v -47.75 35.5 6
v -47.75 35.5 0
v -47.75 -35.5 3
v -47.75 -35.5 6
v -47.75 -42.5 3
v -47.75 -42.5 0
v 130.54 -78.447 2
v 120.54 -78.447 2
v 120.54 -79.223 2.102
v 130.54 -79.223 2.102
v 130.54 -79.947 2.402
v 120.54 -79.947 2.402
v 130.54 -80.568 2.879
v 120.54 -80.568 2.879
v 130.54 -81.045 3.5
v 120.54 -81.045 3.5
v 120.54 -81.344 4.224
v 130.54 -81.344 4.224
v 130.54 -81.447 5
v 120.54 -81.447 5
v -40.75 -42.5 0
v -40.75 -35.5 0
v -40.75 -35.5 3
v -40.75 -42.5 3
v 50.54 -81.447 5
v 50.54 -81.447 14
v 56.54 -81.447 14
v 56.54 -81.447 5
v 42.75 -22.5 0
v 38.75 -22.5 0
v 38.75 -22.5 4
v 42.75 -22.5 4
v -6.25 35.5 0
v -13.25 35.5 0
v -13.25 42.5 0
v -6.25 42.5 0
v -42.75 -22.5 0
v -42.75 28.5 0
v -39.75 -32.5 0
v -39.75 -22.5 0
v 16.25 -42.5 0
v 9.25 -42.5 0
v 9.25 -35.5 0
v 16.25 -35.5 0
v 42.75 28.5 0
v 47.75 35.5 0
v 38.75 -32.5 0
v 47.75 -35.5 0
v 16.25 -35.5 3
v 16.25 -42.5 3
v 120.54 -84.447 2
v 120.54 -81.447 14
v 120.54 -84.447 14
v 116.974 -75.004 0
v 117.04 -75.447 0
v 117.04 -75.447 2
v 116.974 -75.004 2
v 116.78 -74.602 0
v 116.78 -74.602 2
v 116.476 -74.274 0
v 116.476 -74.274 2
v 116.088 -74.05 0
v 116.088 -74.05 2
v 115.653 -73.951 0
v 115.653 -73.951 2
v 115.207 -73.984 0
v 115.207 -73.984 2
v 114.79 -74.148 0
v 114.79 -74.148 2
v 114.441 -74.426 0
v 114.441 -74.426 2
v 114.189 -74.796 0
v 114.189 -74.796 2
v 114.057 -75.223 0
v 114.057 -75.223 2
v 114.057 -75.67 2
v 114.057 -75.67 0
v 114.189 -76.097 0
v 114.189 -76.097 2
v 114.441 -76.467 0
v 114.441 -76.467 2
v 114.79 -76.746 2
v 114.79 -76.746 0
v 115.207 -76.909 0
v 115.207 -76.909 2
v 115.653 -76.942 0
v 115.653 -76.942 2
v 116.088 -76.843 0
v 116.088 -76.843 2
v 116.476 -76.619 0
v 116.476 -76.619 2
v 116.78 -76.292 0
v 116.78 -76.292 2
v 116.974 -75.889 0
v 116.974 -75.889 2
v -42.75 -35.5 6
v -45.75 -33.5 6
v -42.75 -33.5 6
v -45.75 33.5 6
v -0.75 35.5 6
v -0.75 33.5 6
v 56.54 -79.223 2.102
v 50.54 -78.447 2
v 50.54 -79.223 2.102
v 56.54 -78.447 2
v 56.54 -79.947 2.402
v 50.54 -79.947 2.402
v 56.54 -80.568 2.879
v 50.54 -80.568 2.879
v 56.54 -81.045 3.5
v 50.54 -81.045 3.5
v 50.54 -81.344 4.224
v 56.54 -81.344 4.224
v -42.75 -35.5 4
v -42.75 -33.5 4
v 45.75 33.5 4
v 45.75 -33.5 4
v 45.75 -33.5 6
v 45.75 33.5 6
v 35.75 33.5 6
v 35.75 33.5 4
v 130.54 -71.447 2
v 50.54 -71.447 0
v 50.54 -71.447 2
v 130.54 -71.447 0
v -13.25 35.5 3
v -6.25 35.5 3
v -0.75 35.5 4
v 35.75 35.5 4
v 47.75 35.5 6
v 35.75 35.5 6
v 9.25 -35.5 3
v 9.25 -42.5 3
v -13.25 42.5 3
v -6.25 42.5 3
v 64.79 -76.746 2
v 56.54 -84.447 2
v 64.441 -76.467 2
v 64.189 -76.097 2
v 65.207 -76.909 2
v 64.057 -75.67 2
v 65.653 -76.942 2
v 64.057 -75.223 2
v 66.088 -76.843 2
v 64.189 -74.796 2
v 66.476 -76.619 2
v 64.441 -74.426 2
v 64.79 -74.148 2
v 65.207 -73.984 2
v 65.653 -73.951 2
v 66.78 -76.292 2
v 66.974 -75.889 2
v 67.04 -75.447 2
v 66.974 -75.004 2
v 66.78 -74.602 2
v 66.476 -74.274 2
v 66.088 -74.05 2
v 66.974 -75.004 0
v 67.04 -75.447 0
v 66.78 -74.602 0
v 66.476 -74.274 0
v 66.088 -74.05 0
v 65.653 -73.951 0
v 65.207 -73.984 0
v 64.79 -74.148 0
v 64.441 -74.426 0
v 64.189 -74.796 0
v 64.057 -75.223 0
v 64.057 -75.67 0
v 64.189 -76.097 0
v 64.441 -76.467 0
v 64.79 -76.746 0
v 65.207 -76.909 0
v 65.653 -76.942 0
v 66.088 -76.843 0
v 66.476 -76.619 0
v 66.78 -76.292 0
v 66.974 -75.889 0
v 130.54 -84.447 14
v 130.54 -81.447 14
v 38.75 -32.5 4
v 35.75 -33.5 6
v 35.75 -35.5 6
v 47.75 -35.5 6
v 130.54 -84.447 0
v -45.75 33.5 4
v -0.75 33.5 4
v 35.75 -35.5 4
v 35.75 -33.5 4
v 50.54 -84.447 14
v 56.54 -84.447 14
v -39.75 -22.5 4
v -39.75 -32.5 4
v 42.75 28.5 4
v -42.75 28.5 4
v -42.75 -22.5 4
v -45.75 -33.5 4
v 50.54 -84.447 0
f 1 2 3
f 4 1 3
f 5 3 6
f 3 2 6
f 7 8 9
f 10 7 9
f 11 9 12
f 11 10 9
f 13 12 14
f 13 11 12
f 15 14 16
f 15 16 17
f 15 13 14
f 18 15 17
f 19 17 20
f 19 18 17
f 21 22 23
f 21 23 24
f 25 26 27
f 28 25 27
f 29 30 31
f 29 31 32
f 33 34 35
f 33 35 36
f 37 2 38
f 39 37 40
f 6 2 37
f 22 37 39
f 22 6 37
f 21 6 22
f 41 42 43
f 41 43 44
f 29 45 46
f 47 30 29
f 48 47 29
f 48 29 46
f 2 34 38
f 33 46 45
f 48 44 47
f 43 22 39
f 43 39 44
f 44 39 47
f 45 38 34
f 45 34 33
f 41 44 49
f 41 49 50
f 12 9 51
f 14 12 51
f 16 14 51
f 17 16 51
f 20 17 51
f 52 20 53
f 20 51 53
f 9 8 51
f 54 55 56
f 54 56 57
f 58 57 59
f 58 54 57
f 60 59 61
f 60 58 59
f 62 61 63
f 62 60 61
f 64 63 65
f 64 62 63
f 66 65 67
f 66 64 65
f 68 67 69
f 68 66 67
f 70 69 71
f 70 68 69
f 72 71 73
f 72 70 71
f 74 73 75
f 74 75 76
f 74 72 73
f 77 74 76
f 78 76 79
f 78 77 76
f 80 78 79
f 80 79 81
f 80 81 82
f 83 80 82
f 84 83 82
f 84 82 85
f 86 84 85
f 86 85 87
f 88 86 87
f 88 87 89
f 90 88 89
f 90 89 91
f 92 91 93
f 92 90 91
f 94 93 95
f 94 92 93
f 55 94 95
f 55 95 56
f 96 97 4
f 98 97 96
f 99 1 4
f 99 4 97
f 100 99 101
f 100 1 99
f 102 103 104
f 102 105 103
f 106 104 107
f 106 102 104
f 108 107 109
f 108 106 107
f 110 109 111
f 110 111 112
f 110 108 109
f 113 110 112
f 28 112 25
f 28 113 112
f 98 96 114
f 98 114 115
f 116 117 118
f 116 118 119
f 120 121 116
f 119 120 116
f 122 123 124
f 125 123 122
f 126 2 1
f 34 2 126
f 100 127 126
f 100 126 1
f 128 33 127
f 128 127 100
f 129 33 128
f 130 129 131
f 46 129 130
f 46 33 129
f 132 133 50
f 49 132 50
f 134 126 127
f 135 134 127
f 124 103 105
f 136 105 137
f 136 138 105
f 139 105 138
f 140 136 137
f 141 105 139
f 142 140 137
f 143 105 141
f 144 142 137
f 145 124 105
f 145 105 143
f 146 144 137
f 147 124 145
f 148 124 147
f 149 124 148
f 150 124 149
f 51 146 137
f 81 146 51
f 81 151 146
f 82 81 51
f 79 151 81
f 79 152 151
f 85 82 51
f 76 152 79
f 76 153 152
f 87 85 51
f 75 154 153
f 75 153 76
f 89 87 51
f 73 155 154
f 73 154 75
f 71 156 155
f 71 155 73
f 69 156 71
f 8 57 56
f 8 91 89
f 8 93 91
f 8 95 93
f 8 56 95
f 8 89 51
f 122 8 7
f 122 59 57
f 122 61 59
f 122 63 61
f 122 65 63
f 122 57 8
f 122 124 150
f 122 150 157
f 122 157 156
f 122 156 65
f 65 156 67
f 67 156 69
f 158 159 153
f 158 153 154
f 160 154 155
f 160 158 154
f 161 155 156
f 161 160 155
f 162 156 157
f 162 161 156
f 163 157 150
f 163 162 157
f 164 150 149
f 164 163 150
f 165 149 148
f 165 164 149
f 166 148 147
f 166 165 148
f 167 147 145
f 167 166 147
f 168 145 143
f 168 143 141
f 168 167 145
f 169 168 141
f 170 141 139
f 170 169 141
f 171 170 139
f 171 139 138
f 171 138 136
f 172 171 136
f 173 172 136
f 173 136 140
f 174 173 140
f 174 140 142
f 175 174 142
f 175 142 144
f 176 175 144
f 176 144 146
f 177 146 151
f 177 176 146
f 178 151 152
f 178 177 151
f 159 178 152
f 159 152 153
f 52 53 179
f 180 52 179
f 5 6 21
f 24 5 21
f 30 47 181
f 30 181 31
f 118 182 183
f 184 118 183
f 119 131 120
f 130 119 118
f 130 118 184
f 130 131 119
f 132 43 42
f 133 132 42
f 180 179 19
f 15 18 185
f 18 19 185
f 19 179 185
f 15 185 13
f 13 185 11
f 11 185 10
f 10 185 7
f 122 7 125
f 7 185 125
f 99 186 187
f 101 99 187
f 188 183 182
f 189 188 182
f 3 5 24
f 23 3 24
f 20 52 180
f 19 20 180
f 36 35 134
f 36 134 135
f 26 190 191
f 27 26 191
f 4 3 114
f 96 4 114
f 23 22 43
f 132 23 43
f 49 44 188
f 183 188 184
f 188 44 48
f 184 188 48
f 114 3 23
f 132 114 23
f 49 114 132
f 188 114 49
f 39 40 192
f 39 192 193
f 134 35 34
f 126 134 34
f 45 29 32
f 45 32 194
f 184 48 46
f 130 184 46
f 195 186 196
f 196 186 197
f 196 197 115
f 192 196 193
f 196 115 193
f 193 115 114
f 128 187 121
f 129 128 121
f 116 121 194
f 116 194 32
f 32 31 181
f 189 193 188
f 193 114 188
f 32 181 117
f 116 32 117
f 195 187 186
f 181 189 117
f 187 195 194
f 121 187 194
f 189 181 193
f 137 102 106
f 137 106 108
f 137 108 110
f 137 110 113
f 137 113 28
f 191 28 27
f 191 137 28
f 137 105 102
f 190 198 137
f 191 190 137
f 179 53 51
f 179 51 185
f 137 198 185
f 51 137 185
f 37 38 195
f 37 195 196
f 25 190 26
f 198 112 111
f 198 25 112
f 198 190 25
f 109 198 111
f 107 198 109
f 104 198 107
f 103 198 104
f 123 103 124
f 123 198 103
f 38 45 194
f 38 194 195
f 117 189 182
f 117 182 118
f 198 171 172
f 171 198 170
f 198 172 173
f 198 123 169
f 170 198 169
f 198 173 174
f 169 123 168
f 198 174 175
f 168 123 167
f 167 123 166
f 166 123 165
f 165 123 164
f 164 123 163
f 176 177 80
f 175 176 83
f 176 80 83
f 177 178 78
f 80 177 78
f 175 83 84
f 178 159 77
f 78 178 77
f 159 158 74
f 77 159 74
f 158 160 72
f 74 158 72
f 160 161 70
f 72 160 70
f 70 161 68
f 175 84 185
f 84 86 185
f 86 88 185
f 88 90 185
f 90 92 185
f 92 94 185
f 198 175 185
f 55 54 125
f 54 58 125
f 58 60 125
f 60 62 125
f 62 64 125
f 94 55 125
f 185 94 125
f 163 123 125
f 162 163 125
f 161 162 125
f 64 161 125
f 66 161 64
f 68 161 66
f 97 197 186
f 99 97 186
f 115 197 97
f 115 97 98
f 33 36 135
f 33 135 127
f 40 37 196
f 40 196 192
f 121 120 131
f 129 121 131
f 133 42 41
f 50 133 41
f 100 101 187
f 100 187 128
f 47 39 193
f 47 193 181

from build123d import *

# Parameters (mm, degrees)
F0_W      = 95.5
F0_H      = 71
F0_W_2    = 91.5
F0_H_2    = 67
F1_DEPTH  = 6
F2_W      = 91.5
F2_H      = 67
F3_DEPTH  = 4
F4_W      = 78.5
F4_H      = 2
F4_W_2    = 36.5
F5_DEPTH  = 2
F6_W      = 7
F6_H      = 7
F7_DEPTH  = 3
F8_W      = 80
F8_H      = 13
F8_R      = 1.5
F9_DEPTH  = 2
F10_W     = 10
F10_H     = 14
F10_W_2   = 6
F11_DEPTH = 3
F12_R     = 3


with BuildPart() as f1:
    # F0 (on Top) → F1 (new body)
    with BuildSketch(Plane.XY):
        Rectangle(F0_W, F0_H)
        Rectangle(F0_W_2, F0_H_2, mode=Mode.SUBTRACT)
    extrude(amount=F1_DEPTH)

    # F2 (on face) → F3 (join)
    with BuildSketch(Plane(origin=(0, 0, 0), x_dir=(1, 0, 0), z_dir=(0, 0, -1))):
        Rectangle(F2_W, F2_H)
        Polygon((-30.75, -28.5), (-42.75, -28.5), (-42.75, 22.5), (-39.75, 22.5), (-39.75, 32.5), (38.75, 32.5), (38.75, 22.5), (42.75, 22.5), (42.75, -28.5), (-20.75, -28.5), align=None, mode=Mode.SUBTRACT)
    extrude(amount=-F3_DEPTH)

    # F4 (on face) → F5 (cut)
    with BuildSketch(Plane.XY.offset(6)):
        with Locations((-3.5, -34.5)):
            Rectangle(F4_W, F4_H)
        with Locations((17.5, 34.5)):
            Rectangle(F4_W_2, F4_H)
    extrude(amount=-F5_DEPTH, mode=Mode.SUBTRACT)

    # F6 (on face) → F7 (join)
    with BuildSketch(Plane(origin=(0, 0, 0), x_dir=(1, 0, 0), z_dir=(0, 0, -1))):
        with Locations((-44.25, 39)):
            Rectangle(F6_W, F6_H)
        with Locations((-9.75, -39)):
            Rectangle(F6_W, F6_H)
        with Locations((12.75, 39)):
            Rectangle(F6_W, F6_H)
    extrude(amount=-F7_DEPTH)


with BuildPart() as f9:
    # F8 (on Top) → F9 (new body)
    with BuildSketch(Plane.XY):
        with Locations((90.540446, -77.946569)):
            Rectangle(F8_W, F8_H)
        with Locations((65.540446, -75.446569)):
            Circle(F8_R, mode=Mode.SUBTRACT)
        with Locations((115.540446, -75.446569)):
            Circle(F8_R, mode=Mode.SUBTRACT)
    extrude(amount=F9_DEPTH)

    # F10 (on face) → F11 (join)
    with BuildSketch(Plane.XZ.offset(84.446569)):
        with Locations((125.540446, 7)):
            Rectangle(F10_W, F10_H)
        with Locations((53.540446, 7)):
            Rectangle(F10_W_2, F10_H)
    extrude(amount=-F11_DEPTH)

    # F12
    f12_edges = [f9.edges().sort_by_distance(p)[0] for p in [
        (53.540446, -81.446569, 2),
        (125.540446, -81.446569, 2),
    ]]
    fillet(f12_edges, radius=F12_R)


solid = Compound([f1.part, f9.part])
